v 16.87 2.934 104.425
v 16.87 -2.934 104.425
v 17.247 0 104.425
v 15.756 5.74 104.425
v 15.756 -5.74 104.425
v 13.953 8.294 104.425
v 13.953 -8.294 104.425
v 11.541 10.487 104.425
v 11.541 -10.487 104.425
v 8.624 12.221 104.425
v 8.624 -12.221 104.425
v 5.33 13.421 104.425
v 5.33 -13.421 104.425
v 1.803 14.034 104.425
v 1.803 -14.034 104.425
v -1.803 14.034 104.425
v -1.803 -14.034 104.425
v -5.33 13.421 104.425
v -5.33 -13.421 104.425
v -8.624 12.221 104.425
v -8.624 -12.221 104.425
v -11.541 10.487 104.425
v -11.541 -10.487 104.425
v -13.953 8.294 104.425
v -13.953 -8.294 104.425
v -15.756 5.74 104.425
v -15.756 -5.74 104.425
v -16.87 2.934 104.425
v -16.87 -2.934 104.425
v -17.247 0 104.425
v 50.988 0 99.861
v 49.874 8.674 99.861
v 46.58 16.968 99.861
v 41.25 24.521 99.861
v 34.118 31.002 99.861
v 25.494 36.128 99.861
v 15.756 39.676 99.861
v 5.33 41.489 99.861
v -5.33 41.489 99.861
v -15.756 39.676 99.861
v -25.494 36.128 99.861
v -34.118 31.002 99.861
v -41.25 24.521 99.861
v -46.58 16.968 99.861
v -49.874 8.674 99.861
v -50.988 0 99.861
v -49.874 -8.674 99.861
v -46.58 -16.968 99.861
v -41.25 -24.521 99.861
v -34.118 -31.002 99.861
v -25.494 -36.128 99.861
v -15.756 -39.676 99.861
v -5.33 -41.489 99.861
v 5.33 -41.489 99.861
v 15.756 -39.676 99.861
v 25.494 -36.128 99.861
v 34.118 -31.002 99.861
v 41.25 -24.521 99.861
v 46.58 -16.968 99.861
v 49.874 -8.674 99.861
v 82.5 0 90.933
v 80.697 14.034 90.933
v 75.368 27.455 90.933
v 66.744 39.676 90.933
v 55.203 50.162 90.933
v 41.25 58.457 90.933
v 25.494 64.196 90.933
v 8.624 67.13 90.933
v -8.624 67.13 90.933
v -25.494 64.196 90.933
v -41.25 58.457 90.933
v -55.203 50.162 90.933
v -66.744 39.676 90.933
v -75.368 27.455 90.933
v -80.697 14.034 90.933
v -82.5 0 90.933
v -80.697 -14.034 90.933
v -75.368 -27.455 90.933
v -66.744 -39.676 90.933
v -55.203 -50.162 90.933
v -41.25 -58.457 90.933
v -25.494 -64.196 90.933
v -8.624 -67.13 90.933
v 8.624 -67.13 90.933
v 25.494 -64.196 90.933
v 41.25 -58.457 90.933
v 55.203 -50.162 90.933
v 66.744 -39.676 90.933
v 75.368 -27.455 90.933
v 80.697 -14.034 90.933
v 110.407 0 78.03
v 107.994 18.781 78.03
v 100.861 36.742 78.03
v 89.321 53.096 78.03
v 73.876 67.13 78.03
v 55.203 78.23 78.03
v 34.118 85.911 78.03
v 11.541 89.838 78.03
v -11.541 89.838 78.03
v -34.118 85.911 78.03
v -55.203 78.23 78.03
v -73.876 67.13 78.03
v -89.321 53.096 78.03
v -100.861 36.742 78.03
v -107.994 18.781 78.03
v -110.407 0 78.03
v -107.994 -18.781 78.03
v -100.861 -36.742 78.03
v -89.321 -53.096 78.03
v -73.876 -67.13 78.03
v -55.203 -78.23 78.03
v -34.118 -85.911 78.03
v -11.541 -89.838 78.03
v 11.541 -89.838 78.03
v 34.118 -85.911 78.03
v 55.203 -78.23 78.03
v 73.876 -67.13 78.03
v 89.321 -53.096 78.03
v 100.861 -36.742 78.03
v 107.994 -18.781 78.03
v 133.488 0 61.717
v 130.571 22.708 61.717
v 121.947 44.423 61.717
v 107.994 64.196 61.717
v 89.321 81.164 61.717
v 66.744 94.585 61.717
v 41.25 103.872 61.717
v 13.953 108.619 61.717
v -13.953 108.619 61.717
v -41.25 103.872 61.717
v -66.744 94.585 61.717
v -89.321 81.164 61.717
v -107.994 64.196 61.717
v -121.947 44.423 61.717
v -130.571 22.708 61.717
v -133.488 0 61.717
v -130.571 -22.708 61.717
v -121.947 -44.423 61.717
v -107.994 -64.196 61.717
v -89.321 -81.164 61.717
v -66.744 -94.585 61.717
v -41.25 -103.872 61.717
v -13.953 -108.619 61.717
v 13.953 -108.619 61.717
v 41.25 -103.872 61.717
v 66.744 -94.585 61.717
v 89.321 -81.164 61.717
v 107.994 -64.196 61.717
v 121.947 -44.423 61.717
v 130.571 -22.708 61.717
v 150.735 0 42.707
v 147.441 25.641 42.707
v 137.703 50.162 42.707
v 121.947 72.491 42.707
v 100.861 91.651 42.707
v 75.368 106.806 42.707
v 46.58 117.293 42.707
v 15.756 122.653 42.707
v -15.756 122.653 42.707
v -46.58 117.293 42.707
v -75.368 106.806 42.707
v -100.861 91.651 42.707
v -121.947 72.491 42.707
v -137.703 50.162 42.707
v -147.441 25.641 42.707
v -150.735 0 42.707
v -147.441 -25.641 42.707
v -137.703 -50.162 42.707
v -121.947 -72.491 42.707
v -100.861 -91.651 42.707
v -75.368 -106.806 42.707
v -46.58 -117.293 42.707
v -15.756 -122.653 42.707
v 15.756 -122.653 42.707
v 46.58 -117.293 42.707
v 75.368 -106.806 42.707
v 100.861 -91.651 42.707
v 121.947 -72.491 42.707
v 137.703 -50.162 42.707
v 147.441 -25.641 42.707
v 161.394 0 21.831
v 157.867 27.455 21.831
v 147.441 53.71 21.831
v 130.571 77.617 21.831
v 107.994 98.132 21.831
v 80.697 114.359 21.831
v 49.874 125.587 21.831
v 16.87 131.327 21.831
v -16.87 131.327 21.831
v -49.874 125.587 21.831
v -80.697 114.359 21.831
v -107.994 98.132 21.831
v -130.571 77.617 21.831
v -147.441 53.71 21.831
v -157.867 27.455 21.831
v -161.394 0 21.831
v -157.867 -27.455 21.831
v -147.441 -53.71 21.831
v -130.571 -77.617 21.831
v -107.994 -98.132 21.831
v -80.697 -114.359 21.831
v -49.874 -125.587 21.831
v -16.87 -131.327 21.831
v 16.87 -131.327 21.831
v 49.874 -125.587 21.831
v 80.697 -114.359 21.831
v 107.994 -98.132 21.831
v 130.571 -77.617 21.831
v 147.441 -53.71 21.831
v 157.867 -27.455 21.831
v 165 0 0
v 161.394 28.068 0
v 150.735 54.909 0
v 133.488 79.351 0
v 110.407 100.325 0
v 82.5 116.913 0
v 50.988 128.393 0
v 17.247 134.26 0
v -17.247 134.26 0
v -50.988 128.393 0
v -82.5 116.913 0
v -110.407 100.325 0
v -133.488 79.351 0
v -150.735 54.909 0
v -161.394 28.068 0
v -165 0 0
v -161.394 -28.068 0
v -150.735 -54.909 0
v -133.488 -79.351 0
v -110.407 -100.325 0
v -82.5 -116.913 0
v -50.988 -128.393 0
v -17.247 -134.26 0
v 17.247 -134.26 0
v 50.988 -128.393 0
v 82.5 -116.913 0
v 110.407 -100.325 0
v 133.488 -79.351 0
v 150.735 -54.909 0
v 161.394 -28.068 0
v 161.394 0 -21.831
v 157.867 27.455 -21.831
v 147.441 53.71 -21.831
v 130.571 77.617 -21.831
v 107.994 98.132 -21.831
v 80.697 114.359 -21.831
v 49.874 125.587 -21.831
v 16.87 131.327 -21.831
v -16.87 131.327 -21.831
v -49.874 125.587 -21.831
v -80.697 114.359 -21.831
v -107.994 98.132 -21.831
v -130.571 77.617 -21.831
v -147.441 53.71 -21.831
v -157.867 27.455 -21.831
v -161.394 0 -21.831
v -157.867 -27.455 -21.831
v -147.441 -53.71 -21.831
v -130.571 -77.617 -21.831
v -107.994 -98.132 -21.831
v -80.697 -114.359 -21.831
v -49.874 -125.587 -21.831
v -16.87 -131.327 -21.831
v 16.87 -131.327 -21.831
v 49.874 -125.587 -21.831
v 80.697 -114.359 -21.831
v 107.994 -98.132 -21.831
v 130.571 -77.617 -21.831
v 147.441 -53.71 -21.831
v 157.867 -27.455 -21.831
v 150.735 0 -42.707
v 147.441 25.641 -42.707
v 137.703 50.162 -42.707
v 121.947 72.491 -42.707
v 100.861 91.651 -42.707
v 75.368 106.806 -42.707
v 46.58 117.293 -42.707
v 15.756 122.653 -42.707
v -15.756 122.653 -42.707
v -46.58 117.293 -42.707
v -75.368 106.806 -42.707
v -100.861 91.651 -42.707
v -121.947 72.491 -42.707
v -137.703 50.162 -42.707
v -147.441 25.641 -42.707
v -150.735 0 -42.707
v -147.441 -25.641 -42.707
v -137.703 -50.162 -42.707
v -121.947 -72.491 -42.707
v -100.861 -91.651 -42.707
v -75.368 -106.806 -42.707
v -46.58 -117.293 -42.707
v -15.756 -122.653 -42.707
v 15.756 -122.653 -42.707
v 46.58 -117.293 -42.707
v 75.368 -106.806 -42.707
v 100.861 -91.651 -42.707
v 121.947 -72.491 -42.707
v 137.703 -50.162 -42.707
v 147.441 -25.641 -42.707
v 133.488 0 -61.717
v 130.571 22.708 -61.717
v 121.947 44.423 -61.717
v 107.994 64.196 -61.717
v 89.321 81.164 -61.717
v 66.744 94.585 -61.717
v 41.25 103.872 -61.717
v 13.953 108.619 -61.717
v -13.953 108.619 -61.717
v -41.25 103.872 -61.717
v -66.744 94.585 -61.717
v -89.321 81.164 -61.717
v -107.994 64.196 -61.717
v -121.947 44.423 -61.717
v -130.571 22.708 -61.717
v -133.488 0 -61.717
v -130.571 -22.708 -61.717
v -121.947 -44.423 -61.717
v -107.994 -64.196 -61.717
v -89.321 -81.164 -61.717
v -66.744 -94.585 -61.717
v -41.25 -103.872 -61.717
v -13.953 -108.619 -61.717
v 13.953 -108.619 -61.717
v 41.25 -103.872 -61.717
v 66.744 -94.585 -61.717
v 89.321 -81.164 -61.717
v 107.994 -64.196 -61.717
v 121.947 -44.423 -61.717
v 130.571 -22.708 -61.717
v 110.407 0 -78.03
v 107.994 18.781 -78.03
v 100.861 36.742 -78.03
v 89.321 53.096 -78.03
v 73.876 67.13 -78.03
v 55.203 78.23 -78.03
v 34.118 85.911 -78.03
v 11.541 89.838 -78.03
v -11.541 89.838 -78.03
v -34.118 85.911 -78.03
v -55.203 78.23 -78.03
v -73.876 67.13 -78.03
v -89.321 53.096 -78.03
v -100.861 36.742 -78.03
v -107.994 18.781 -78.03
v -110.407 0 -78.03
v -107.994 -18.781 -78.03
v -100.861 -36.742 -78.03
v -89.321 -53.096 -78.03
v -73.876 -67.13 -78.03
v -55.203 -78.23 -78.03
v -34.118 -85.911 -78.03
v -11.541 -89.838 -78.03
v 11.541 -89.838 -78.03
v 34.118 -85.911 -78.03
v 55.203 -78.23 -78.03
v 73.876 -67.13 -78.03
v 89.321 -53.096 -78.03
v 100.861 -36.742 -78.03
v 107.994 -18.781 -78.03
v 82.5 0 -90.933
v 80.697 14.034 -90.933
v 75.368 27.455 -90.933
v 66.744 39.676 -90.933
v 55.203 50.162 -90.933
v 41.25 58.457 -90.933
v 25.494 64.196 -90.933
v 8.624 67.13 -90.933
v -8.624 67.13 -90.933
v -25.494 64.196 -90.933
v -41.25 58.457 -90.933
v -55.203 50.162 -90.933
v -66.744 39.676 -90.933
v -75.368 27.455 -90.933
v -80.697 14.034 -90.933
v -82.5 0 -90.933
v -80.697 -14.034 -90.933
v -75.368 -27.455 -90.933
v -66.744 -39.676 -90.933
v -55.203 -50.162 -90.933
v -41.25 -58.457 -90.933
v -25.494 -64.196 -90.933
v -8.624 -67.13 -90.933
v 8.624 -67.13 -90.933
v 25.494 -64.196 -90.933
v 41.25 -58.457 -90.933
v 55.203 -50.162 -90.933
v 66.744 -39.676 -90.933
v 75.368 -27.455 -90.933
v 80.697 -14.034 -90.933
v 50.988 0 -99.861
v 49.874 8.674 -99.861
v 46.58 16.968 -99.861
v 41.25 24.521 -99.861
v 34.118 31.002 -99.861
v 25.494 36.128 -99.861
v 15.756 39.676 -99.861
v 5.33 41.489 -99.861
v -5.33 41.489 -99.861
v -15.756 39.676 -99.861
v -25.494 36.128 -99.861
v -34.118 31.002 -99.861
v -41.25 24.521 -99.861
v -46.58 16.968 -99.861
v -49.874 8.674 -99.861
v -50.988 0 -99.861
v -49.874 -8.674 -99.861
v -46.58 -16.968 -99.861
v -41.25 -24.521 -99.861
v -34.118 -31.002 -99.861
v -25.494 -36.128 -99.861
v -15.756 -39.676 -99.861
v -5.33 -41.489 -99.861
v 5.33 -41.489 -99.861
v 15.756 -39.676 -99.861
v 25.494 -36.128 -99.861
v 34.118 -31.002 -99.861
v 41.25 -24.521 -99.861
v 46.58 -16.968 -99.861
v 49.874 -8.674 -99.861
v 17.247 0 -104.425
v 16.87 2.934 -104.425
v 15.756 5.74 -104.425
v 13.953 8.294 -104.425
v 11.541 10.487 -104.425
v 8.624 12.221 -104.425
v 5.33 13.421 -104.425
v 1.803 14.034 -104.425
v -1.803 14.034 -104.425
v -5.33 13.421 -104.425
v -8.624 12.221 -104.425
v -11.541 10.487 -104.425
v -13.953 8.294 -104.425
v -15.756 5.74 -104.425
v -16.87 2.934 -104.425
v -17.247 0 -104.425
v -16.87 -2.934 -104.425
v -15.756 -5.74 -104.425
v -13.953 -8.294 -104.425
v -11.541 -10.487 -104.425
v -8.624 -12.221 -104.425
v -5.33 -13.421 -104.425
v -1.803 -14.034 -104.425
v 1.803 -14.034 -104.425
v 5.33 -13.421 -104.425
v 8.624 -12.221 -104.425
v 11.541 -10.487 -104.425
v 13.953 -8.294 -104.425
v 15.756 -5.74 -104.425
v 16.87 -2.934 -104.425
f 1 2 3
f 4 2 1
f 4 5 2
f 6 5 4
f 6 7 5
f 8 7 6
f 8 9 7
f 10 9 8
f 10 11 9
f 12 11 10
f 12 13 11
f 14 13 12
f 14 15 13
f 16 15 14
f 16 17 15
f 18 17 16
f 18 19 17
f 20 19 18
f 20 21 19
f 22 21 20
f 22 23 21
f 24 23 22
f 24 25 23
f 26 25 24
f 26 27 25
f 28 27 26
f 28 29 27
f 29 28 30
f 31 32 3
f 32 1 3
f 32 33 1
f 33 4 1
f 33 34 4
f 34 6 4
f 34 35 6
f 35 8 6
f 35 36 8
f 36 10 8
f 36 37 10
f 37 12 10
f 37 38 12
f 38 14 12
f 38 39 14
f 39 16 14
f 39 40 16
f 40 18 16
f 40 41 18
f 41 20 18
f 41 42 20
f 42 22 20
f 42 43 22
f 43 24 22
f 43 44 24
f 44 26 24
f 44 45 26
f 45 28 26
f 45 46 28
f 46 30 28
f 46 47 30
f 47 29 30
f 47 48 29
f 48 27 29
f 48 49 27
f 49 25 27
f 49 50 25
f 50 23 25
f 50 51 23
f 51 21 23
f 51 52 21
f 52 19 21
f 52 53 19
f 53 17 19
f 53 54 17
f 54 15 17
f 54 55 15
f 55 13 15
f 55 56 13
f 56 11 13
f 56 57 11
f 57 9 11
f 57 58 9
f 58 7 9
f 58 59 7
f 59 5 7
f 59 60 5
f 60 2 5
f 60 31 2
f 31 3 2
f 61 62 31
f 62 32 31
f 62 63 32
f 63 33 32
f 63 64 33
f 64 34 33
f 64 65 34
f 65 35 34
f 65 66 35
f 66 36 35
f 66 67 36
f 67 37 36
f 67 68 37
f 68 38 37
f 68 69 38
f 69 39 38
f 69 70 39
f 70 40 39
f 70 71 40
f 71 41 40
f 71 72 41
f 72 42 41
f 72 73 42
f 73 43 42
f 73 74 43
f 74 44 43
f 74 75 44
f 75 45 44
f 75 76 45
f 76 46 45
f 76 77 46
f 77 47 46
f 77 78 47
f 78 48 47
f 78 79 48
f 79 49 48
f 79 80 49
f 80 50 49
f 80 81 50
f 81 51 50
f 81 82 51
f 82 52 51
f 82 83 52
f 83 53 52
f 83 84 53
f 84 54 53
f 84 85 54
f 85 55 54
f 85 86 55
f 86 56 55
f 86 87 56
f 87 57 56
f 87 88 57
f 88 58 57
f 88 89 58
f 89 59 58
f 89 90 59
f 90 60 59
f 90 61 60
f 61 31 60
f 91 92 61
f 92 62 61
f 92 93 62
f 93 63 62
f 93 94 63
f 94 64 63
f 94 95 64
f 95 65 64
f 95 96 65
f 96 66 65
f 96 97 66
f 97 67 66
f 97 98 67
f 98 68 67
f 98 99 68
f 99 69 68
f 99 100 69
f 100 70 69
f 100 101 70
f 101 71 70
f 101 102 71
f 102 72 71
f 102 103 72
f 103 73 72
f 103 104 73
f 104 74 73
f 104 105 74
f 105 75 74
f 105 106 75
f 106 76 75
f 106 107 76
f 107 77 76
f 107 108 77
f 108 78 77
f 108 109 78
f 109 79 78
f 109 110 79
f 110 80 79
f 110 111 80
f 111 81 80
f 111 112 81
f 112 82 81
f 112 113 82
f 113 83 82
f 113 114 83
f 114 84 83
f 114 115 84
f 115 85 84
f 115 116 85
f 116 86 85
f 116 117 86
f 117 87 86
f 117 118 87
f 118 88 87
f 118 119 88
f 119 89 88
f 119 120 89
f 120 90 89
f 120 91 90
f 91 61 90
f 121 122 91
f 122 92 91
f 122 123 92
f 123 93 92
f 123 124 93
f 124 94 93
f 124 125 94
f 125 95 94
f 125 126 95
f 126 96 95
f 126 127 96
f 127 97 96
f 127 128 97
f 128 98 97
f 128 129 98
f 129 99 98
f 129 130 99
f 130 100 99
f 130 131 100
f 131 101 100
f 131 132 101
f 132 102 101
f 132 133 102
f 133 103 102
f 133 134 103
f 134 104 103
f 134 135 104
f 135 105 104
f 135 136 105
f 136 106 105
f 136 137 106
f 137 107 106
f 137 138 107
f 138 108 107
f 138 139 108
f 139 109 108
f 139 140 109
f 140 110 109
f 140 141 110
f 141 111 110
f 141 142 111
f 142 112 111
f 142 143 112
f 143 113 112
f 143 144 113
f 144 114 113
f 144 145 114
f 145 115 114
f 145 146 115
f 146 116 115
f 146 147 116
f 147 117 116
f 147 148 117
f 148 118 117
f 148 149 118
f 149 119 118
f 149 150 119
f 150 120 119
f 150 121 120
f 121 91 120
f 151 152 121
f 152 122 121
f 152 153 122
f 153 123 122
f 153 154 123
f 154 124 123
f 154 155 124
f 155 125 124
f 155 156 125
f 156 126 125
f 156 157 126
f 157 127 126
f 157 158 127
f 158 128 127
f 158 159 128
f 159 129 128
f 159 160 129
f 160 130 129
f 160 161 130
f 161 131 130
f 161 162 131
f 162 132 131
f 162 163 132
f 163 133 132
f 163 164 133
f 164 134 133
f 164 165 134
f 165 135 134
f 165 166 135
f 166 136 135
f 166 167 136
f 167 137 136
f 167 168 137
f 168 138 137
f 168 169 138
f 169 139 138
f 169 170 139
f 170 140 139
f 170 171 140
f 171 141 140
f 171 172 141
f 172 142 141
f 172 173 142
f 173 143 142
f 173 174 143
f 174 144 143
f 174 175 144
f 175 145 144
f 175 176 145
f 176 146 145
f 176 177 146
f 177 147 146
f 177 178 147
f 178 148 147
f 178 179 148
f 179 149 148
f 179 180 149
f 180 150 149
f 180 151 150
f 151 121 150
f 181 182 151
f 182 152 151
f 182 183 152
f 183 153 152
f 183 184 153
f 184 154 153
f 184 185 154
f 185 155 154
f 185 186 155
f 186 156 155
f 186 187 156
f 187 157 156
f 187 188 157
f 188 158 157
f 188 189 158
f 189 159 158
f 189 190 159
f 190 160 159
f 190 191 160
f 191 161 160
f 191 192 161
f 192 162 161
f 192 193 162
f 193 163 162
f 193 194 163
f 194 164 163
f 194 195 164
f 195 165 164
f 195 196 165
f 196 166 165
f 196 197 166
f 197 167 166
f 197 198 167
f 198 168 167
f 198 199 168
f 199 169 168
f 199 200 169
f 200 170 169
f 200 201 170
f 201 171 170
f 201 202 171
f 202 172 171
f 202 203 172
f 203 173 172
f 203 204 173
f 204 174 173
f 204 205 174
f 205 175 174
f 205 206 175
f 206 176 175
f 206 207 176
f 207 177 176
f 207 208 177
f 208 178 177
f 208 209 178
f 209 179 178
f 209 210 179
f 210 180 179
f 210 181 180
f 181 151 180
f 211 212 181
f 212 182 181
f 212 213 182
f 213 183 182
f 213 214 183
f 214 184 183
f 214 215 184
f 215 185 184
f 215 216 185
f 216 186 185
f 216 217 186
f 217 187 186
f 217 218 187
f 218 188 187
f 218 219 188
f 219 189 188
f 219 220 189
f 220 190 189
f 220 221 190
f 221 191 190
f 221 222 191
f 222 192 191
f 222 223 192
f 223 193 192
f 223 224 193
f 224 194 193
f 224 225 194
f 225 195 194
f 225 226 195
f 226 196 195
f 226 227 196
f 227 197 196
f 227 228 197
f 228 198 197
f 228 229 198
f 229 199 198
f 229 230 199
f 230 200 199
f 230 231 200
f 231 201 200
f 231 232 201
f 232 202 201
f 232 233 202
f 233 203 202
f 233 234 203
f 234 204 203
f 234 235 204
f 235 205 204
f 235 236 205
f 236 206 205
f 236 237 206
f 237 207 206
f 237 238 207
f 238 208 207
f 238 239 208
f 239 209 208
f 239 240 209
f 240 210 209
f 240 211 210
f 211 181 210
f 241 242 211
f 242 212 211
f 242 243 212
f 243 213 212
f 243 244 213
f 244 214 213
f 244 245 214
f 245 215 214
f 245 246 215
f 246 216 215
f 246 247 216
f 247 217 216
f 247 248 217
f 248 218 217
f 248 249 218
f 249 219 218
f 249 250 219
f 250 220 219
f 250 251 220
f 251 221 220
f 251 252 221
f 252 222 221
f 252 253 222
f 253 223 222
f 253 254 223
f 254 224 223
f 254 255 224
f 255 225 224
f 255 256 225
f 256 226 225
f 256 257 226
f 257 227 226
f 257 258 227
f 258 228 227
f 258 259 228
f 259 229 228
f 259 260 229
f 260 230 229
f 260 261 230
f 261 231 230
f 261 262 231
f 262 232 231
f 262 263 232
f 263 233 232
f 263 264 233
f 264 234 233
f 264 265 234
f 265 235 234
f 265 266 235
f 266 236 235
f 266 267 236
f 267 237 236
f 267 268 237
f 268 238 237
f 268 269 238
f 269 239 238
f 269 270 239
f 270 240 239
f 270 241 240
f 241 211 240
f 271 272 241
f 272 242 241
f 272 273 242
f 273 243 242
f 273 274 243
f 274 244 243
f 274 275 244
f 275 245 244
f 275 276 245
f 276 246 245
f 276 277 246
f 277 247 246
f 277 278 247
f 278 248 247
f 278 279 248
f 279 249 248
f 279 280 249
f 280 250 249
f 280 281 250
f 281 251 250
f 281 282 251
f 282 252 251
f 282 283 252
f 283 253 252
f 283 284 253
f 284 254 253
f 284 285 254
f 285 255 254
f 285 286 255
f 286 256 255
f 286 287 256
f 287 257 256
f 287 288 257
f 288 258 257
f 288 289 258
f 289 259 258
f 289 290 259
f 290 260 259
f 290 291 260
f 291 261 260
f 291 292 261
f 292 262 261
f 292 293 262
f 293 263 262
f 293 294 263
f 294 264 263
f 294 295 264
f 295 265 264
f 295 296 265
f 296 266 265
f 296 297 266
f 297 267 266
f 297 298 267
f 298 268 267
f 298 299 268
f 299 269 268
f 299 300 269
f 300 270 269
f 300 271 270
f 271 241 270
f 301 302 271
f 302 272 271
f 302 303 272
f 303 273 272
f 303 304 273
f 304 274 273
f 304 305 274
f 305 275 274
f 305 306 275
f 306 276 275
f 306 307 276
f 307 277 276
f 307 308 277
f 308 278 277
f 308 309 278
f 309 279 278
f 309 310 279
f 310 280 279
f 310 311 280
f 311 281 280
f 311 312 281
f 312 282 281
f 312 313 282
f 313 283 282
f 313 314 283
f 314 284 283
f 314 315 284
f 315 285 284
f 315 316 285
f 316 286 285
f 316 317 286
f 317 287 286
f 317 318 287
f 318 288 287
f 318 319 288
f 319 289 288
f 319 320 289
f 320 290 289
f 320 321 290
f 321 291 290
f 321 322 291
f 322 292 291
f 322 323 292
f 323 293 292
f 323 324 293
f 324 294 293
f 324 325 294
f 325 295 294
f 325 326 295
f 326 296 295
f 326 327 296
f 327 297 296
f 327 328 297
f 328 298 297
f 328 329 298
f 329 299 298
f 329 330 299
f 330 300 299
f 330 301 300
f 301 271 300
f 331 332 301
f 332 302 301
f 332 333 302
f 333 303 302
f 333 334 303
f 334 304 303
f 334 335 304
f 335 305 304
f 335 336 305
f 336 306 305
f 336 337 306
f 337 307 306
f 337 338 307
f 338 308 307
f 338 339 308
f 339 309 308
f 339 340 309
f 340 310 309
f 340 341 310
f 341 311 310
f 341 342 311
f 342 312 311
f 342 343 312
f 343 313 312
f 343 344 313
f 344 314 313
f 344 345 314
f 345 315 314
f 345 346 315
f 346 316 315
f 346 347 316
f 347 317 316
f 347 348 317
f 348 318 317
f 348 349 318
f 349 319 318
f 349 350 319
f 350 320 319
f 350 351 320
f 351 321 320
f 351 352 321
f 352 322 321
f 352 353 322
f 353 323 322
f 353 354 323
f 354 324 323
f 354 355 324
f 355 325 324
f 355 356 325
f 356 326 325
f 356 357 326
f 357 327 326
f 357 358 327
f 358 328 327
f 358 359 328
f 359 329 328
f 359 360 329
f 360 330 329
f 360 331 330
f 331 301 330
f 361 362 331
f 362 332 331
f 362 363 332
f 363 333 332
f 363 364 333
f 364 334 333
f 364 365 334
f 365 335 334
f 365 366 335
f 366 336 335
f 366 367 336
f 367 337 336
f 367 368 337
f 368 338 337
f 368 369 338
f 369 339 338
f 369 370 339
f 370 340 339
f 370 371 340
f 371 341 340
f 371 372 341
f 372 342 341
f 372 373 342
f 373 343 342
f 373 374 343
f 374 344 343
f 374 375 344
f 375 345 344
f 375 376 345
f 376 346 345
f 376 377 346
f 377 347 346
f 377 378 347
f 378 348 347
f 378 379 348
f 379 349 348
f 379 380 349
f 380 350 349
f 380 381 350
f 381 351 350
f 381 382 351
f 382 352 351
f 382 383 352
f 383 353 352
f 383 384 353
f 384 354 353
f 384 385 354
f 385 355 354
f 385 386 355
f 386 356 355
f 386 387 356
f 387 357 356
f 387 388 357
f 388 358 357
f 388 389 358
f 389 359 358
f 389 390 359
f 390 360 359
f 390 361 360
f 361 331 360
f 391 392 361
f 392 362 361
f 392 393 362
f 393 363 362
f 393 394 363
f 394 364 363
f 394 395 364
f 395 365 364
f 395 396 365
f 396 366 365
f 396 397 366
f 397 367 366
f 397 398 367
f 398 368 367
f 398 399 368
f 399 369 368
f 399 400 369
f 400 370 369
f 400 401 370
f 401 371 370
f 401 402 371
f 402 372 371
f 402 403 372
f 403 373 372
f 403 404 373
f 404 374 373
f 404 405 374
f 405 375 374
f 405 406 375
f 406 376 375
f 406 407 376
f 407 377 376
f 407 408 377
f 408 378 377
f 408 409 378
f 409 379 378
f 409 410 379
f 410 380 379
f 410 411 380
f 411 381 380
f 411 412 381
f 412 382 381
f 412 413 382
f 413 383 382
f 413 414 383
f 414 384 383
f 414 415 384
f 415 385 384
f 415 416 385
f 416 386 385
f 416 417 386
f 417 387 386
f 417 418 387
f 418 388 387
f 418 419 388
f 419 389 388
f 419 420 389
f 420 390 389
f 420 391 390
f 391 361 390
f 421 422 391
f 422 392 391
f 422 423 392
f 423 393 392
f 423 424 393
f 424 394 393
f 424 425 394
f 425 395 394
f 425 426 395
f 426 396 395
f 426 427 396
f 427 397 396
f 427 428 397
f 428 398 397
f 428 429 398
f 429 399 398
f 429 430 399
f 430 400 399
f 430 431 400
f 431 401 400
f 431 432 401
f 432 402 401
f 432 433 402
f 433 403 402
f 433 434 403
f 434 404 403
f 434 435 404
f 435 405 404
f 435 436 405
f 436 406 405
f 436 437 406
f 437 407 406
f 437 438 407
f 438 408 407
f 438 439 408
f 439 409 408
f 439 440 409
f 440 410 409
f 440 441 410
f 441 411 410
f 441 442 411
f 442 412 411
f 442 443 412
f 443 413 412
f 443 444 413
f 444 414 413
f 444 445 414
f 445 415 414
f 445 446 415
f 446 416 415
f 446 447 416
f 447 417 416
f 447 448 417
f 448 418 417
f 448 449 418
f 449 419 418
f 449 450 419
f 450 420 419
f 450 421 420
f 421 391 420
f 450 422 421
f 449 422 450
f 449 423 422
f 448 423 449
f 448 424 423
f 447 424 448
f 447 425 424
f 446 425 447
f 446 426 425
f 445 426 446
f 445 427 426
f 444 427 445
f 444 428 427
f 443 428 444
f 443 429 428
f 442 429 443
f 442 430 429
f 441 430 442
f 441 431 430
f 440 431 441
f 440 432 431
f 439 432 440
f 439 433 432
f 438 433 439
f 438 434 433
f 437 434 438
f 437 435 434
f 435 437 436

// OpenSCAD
// Generated by SolidPython 1.0.1 on 2020-07-29 00:46:49


scale(v = [11, 9, 7]) {
	sphere(r = 15);
}
/***********************************************
*********      SolidPython code:      **********
************************************************
 
# import packages: SolidPython
from solid import *
from solid.utils import *
from itertools import chain, combinations, permutations


class Resize:

    def __init__(self, scad_file):
        self.scad_file = scad_file
        #self.scad_file = import_scad(scad_file)
        # cone/cylinder param:
        self.r1 = 0
        self.r2 = 0
        self.h = 0
        # rectangular prism param:
        self.w = 0
        self.l = 0
        # ellipse param:
        self.r = 0

    # import OpenScad code (file name corresponds to shape)


    # classify shape + parameters
    def assign(self, param1, param2, param3):
        if self.scad_file == 'cone.scad':
            self.r1 = param1
            self.r2 = param2
            self.h = param3
        elif self.scad_file == 'cylinder.scad':
            self.r1 = param1
            self.r2 = param2
            self.h = param3
        elif self.scad_file == 'rectangularPrism.scad':
            self.h = param1
            self.l = param2
            self.w = param3
        else:
            self.r = param1
            self.h = param2

    # resize parameters
    def iterate(self):
        x = range(3, 20, 2)
        i = 1
        if self.scad_file == 'cone.scad':
            tempList = list(permutations(x, 2))
            for temp in tempList:
                param1 = temp[0]
                param2 = temp[1]
                filepath = 'produced_scad_files/' + 'cone' + str(param1) + '_' + str(param2) + '_' + '.scad'
                scad_render_to_file(cylinder(h=param1, r1=param2, r2=0), filepath)

        elif self.scad_file == 'cylinder.scad':
            tempList = list(permutations(x, 3))
            for temp in tempList:
                param1 = temp[0]
                param2 = temp[1]
                filepath = 'produced_scad_files/' + 'cylinder' + str(param1) + '_' + str(param2) + '_' + '.scad'
                scad_render_to_file(cylinder(h=param1, r1=param2, r2=param2), filepath)

        elif self.scad_file == 'rectangularPrism.scad':
            tempList = list(permutations(x, 3))
            for temp in tempList:
                param1 = temp[0]
                param2 = temp[1]
                param3 = temp[2]
                filepath = 'produced_scad_files/' + 'rectangularPrism' + str(param1) + '_' + str(param2) + '_' + str(
                    param3) + '.scad'
                scad_render_to_file(cube(size=(param1, param2, param3)), filepath)

        elif self.scad_file == 'ellipse.scad':
            tempList = list(permutations(x, 4))
            for temp in tempList:
                param1 = temp[0]
                param2 = temp[1]
                param3 = temp[2]
                param4 = temp[3]
                filepath = 'produced_scad_files/' + 'ellipse' + str(param1) + '_' + str(param2) + '_' + str(param3) + '_' + str(param4) + '.scad'
                scad_render_to_file(scale([param1, param2, param3])(sphere(r=param4)), filepath)

    def render_to_scadfile(self):
        scad_render_to_file(scad, 'example.scad') 
 
************************************************/
